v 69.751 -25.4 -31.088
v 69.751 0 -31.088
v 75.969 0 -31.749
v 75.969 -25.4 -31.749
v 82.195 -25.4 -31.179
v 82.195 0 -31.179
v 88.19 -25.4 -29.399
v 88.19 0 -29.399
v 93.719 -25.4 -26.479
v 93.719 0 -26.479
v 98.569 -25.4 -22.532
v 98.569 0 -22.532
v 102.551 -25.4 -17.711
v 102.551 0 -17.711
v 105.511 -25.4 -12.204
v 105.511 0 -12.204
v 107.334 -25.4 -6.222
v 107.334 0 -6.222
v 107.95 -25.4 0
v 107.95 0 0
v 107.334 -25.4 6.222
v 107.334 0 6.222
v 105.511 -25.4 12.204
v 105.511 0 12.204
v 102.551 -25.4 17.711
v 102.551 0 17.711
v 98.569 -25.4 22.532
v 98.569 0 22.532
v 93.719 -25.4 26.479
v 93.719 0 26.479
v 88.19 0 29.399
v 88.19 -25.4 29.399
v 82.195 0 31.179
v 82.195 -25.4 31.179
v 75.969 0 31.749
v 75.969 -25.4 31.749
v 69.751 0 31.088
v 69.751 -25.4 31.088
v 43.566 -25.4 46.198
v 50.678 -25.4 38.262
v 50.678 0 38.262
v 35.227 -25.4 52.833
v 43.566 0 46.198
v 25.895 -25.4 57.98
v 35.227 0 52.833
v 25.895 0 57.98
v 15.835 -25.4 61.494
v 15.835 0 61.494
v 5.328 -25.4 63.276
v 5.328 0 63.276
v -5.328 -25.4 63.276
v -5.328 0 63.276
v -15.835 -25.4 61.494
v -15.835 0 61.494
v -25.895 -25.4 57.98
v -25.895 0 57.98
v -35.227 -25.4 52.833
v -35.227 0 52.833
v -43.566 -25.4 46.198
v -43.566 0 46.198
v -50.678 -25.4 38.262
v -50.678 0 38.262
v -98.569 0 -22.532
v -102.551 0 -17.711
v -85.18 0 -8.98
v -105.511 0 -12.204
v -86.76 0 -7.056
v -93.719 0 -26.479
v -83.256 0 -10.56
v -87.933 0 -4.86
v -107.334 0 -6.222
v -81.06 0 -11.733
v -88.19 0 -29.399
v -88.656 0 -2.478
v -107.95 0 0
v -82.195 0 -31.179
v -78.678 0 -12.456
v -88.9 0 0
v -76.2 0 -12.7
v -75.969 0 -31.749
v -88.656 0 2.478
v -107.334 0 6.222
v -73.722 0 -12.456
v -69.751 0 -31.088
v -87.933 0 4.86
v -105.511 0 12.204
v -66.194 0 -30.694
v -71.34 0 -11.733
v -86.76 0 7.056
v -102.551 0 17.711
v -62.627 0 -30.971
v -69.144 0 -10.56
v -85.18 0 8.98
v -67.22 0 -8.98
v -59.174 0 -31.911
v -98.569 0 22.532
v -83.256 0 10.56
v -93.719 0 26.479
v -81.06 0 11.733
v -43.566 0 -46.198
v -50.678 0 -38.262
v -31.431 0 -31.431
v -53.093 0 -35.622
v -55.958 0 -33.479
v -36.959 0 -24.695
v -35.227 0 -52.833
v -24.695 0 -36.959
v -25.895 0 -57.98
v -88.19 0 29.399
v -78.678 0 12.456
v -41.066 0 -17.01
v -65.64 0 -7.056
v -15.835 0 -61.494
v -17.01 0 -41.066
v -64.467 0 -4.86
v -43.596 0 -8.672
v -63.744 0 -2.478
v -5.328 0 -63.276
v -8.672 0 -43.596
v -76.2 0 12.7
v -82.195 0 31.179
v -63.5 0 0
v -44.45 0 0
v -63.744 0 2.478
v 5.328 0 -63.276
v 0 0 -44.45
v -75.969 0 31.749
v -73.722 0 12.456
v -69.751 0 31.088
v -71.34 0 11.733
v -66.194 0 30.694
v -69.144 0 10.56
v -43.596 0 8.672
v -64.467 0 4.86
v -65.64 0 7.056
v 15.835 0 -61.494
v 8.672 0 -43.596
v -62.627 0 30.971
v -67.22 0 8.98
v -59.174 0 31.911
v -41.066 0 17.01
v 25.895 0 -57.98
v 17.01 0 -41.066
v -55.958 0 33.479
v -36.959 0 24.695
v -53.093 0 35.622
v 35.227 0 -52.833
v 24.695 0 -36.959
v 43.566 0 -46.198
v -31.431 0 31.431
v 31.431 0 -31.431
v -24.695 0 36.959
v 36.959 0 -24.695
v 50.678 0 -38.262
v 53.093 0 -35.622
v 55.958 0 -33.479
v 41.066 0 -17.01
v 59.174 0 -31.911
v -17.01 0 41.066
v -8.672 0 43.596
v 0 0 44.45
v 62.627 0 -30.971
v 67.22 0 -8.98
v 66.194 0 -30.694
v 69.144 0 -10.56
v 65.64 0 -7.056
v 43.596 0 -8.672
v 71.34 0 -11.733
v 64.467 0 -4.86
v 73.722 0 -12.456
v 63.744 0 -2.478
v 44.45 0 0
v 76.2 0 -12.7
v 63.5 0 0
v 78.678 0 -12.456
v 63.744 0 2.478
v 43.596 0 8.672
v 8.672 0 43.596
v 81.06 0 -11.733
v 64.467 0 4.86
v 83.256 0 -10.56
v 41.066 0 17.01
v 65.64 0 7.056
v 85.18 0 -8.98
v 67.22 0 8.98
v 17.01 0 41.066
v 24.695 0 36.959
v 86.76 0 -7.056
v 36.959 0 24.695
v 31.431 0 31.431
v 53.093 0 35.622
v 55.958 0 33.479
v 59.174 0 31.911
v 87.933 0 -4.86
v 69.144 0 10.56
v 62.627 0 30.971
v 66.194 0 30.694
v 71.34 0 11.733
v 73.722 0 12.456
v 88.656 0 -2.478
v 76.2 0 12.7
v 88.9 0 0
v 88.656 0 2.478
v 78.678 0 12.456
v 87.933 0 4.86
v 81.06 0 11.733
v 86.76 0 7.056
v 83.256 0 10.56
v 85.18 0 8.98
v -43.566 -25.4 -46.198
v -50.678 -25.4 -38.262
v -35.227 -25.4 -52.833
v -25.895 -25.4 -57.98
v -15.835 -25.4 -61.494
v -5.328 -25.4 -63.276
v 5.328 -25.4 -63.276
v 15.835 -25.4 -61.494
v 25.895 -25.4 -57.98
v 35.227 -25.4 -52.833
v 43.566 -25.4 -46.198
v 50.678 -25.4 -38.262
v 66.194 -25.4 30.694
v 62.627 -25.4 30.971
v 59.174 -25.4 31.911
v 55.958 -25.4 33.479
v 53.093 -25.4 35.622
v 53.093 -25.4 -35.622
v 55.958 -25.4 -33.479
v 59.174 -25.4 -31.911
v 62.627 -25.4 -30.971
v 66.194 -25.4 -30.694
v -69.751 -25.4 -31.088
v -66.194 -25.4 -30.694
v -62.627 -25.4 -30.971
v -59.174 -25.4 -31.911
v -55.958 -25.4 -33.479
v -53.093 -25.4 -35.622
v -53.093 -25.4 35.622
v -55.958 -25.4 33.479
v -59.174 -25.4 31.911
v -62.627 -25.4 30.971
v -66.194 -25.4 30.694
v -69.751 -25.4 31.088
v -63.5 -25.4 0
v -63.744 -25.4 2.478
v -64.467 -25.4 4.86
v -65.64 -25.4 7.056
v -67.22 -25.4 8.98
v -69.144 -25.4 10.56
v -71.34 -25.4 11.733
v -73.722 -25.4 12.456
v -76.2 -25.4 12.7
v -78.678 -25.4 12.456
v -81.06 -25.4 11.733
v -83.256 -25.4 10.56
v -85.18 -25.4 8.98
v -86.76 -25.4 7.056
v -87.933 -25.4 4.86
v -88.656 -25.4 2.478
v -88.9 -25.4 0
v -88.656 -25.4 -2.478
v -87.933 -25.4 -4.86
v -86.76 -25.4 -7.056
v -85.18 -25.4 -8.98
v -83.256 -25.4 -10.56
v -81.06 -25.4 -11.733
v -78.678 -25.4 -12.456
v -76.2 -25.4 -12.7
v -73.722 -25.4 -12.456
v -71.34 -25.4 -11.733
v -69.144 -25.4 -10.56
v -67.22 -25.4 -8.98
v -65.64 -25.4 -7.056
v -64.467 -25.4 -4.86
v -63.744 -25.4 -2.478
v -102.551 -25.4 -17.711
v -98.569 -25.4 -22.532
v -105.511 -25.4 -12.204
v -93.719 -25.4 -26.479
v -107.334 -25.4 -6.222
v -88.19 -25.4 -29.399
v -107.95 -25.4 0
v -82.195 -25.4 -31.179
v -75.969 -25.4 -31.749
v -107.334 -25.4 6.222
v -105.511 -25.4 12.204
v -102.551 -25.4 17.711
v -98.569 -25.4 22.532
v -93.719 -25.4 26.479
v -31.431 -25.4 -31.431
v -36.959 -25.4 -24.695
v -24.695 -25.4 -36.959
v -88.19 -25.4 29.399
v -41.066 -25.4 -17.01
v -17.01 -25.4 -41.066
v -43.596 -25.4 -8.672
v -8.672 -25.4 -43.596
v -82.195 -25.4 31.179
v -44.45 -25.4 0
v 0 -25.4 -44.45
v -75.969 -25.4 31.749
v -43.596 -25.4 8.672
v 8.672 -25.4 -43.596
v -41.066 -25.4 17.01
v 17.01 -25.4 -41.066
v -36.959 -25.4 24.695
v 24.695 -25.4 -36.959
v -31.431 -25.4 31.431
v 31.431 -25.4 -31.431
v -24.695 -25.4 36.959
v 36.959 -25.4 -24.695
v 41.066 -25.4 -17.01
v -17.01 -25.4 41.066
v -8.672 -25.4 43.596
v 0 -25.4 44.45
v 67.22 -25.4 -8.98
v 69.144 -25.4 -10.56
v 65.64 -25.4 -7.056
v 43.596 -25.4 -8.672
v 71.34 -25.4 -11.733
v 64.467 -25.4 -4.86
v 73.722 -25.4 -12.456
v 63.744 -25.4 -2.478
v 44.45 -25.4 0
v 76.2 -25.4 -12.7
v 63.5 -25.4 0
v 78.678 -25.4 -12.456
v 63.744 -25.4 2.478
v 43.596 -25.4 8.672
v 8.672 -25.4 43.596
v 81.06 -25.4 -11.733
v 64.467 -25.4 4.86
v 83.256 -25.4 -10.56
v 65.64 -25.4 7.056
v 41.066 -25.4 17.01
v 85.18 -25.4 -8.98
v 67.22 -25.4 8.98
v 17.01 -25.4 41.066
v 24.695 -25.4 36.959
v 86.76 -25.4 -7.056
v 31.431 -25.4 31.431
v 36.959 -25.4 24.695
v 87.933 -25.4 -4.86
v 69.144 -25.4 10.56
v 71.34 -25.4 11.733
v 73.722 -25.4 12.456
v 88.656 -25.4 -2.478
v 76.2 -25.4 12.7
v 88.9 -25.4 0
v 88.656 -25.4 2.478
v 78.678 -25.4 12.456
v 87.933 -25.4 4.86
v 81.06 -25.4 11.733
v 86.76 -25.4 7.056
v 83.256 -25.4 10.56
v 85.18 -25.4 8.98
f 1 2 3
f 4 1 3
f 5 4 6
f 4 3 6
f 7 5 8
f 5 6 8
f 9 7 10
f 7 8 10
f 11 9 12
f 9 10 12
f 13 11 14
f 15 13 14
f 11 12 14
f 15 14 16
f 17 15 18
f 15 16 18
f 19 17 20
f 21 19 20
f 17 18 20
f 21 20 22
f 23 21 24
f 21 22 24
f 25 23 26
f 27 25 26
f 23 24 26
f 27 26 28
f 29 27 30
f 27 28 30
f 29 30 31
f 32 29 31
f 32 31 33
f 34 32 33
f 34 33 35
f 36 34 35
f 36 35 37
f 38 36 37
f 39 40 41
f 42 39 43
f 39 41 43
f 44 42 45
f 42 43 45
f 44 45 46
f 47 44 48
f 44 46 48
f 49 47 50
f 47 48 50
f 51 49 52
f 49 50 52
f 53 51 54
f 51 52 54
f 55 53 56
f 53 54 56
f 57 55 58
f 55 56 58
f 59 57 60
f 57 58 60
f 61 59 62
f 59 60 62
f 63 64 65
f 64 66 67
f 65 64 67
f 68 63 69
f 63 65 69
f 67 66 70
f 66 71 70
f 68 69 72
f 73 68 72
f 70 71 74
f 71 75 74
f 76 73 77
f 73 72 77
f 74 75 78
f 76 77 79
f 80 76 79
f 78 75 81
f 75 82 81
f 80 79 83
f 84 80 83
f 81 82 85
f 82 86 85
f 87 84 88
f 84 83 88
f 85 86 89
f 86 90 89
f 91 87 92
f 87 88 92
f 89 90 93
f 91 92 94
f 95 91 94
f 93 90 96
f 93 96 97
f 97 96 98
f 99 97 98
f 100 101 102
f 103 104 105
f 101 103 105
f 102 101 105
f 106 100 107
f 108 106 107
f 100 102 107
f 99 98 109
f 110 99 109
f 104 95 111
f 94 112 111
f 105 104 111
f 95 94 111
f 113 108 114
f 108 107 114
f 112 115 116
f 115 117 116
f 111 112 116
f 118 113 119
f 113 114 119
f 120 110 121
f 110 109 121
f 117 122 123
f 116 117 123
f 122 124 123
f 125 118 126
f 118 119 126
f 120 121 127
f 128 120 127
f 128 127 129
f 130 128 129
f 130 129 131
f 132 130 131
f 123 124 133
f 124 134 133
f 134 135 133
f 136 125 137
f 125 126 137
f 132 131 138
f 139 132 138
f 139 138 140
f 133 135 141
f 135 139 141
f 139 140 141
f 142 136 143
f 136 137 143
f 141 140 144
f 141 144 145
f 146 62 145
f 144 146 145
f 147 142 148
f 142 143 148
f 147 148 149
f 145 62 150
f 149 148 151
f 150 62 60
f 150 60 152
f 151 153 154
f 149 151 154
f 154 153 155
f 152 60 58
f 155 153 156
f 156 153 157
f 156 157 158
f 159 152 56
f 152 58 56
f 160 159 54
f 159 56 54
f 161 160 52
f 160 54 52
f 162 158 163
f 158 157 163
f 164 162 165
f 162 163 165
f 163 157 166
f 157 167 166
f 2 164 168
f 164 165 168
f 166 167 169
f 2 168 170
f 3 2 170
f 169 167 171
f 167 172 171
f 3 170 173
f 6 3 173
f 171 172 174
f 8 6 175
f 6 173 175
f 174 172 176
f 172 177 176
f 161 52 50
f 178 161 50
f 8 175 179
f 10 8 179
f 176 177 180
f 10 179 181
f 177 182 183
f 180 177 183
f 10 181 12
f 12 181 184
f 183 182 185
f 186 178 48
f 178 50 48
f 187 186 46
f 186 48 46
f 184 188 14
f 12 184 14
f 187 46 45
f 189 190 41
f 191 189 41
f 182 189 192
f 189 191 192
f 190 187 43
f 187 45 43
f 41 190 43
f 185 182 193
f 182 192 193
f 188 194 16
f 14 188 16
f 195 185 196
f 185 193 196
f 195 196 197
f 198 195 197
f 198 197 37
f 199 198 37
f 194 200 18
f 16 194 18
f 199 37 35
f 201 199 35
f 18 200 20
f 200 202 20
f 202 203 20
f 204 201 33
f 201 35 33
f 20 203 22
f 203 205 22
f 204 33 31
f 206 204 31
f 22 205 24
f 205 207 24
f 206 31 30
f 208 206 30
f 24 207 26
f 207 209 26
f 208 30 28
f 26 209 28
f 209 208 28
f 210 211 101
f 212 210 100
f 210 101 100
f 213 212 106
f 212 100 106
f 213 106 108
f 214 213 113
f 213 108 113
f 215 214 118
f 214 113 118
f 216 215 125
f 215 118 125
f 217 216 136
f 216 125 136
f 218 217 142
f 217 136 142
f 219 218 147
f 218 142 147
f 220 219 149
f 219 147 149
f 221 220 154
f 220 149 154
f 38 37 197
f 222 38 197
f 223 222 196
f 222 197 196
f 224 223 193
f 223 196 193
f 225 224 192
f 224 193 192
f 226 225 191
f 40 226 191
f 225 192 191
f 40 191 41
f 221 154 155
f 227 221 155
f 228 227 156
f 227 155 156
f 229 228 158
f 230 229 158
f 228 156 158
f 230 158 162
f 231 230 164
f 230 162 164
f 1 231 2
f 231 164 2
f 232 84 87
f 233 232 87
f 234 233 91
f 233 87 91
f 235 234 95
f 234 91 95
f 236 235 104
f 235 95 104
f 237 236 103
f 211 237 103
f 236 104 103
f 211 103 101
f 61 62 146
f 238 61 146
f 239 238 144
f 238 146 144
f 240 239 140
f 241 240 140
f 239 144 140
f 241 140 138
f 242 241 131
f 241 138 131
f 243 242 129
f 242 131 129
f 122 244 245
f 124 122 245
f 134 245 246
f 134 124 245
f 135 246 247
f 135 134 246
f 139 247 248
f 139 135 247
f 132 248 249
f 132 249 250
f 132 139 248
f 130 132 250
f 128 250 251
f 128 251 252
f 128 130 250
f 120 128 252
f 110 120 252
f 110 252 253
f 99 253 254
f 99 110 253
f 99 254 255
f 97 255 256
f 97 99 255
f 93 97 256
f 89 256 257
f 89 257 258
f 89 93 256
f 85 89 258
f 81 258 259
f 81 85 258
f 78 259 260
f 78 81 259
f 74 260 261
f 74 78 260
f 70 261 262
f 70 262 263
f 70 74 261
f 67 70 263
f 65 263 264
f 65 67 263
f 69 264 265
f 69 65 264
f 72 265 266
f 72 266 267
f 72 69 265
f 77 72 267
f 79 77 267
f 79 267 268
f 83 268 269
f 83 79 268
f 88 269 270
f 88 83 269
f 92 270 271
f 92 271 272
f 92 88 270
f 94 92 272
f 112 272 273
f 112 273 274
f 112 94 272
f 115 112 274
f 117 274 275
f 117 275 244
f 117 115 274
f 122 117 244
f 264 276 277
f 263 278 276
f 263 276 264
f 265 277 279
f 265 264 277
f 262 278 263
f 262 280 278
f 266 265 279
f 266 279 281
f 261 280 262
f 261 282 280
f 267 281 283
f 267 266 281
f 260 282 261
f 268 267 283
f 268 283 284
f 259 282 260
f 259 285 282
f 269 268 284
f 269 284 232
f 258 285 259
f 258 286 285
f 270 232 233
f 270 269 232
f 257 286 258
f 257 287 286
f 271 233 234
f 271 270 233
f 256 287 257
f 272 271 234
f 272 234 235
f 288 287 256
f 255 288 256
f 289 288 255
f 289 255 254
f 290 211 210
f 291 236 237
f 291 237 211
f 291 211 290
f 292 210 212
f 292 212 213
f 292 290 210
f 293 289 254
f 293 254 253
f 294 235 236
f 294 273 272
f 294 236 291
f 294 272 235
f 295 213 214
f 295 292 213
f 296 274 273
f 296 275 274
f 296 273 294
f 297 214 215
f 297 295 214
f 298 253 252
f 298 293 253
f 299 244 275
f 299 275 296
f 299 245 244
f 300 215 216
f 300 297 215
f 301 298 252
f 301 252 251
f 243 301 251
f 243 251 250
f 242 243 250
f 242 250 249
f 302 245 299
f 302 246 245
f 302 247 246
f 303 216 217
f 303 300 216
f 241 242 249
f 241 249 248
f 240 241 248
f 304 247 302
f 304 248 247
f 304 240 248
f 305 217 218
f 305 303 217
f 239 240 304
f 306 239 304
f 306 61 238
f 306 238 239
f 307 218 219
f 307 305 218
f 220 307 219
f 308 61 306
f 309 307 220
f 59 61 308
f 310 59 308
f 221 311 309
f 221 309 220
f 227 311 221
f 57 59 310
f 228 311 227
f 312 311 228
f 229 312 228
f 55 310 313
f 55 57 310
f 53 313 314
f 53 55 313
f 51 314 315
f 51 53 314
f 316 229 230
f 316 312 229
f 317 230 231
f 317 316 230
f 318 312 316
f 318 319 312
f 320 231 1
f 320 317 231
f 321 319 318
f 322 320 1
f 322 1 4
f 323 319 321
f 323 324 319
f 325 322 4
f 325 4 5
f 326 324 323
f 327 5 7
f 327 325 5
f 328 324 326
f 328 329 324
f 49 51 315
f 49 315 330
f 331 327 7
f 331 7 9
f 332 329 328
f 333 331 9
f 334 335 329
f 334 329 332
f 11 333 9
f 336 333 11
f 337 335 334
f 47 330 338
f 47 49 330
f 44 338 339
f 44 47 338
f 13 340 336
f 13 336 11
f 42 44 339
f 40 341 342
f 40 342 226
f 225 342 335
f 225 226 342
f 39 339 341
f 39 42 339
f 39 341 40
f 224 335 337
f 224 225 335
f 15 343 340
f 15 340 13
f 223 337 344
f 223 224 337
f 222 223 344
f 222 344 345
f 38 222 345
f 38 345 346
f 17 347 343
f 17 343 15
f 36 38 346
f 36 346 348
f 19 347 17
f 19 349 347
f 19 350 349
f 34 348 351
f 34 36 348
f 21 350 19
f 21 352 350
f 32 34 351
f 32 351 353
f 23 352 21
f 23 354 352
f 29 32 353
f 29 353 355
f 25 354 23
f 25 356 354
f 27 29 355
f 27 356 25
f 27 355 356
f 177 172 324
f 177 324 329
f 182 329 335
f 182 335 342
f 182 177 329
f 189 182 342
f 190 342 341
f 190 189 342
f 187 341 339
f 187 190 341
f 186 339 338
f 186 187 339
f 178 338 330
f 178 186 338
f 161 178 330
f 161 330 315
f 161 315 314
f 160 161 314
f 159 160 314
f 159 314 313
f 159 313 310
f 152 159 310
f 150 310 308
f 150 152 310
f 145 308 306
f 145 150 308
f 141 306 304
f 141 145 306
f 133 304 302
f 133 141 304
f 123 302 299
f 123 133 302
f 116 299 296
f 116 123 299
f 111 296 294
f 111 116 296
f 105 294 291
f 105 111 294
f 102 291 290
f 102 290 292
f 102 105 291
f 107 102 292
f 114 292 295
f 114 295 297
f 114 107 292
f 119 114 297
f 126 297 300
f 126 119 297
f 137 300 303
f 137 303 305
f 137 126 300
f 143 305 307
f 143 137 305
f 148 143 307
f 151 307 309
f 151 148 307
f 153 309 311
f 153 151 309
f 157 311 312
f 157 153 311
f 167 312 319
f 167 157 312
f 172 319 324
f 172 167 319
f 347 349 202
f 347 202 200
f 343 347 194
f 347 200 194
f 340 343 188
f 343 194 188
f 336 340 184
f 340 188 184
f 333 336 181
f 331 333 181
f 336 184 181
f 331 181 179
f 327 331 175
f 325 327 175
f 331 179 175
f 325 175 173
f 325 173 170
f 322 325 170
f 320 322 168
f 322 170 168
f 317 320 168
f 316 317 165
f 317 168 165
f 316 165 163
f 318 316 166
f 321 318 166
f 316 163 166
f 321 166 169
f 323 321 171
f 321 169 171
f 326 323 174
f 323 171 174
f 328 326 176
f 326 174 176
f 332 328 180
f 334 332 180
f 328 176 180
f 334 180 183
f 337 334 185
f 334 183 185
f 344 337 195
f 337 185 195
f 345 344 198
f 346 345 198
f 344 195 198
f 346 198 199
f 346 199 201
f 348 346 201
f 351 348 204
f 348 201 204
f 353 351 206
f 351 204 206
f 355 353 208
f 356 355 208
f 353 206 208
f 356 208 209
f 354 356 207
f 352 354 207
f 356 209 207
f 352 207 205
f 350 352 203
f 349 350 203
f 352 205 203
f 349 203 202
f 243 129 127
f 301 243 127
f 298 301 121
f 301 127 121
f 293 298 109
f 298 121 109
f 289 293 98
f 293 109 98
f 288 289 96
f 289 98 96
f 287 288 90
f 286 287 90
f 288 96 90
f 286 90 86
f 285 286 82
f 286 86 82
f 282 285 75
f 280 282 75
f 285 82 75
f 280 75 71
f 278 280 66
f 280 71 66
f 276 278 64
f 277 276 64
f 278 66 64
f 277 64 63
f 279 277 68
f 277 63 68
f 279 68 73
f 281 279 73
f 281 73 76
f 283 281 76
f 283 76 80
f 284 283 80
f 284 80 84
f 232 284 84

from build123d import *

# Parameters (mm, degrees)
F0_R     = 12.7
F0_R_2   = 44.45
F1_DEPTH = 25.4
F2_DEPTH = 25.4
F3_DEPTH = 25.4


with BuildPart() as f1:
    # F0 (on Front) → F1 (new body)
    with BuildSketch(Plane.XZ):
        with BuildLine():
            ThreePointArc((-69.75078125, -31.0881018641), (-59.174450896, -31.9106139737), (-50.6778846154, -38.2622792174))
            ThreePointArc((-50.6778846154, -38.2622792174), (0, -63.5), (50.6778846154, -38.2622792174))
            ThreePointArc((50.6778846154, -38.2622792174), (59.174450896, -31.9106139737), (69.75078125, -31.0881018641))
            ThreePointArc((69.75078125, -31.0881018641), (107.95, 0), (69.75078125, 31.0881018641))
            ThreePointArc((69.75078125, 31.0881018641), (59.174450896, 31.9106139737), (50.6778846154, 38.2622792174))
            ThreePointArc((50.6778846154, 38.2622792174), (0, 63.5), (-50.6778846154, 38.2622792174))
            ThreePointArc((-50.6778846154, 38.2622792174), (-59.174450896, 31.9106139737), (-69.75078125, 31.0881018641))
            ThreePointArc((-69.75078125, 31.0881018641), (-107.95, 0), (-69.75078125, -31.0881018641))
        make_face()
        with Locations((-76.2, 0)):
            Circle(F0_R, mode=Mode.SUBTRACT)
        Circle(F0_R_2, mode=Mode.SUBTRACT)
        with BuildLine():
            ThreePointArc((63.5, 0), (76.2, 12.7), (88.9, 0))
            ThreePointArc((88.9, 0), (76.2, -12.7), (63.5, 0))
        make_face(mode=Mode.SUBTRACT)
    extrude(amount=F1_DEPTH)

    # F0 (on Front) → F2 (join)
    with BuildSketch(Plane.XZ):
        with BuildLine():
            ThreePointArc((-69.75078125, -31.0881018641), (-59.174450896, -31.9106139737), (-50.6778846154, -38.2622792174))
            ThreePointArc((-50.6778846154, -38.2622792174), (0, -63.5), (50.6778846154, -38.2622792174))
            ThreePointArc((50.6778846154, -38.2622792174), (59.174450896, -31.9106139737), (69.75078125, -31.0881018641))
            ThreePointArc((69.75078125, -31.0881018641), (107.95, 0), (69.75078125, 31.0881018641))
            ThreePointArc((69.75078125, 31.0881018641), (59.174450896, 31.9106139737), (50.6778846154, 38.2622792174))
            ThreePointArc((50.6778846154, 38.2622792174), (0, 63.5), (-50.6778846154, 38.2622792174))
            ThreePointArc((-50.6778846154, 38.2622792174), (-59.174450896, 31.9106139737), (-69.75078125, 31.0881018641))
            ThreePointArc((-69.75078125, 31.0881018641), (-107.95, 0), (-69.75078125, -31.0881018641))
        make_face()
        with Locations((-76.2, 0)):
            Circle(F0_R, mode=Mode.SUBTRACT)
        Circle(F0_R_2, mode=Mode.SUBTRACT)
        with BuildLine():
            ThreePointArc((63.5, 0), (76.2, 12.7), (88.9, 0))
            ThreePointArc((88.9, 0), (76.2, -12.7), (63.5, 0))
        make_face(mode=Mode.SUBTRACT)
    extrude(amount=F2_DEPTH)

    # F0 (on Front) → F3 (cut)
    with BuildSketch(Plane.XZ):
        Circle(F0_R_2)
    extrude(amount=-F3_DEPTH, mode=Mode.SUBTRACT)


solid = f1.part
